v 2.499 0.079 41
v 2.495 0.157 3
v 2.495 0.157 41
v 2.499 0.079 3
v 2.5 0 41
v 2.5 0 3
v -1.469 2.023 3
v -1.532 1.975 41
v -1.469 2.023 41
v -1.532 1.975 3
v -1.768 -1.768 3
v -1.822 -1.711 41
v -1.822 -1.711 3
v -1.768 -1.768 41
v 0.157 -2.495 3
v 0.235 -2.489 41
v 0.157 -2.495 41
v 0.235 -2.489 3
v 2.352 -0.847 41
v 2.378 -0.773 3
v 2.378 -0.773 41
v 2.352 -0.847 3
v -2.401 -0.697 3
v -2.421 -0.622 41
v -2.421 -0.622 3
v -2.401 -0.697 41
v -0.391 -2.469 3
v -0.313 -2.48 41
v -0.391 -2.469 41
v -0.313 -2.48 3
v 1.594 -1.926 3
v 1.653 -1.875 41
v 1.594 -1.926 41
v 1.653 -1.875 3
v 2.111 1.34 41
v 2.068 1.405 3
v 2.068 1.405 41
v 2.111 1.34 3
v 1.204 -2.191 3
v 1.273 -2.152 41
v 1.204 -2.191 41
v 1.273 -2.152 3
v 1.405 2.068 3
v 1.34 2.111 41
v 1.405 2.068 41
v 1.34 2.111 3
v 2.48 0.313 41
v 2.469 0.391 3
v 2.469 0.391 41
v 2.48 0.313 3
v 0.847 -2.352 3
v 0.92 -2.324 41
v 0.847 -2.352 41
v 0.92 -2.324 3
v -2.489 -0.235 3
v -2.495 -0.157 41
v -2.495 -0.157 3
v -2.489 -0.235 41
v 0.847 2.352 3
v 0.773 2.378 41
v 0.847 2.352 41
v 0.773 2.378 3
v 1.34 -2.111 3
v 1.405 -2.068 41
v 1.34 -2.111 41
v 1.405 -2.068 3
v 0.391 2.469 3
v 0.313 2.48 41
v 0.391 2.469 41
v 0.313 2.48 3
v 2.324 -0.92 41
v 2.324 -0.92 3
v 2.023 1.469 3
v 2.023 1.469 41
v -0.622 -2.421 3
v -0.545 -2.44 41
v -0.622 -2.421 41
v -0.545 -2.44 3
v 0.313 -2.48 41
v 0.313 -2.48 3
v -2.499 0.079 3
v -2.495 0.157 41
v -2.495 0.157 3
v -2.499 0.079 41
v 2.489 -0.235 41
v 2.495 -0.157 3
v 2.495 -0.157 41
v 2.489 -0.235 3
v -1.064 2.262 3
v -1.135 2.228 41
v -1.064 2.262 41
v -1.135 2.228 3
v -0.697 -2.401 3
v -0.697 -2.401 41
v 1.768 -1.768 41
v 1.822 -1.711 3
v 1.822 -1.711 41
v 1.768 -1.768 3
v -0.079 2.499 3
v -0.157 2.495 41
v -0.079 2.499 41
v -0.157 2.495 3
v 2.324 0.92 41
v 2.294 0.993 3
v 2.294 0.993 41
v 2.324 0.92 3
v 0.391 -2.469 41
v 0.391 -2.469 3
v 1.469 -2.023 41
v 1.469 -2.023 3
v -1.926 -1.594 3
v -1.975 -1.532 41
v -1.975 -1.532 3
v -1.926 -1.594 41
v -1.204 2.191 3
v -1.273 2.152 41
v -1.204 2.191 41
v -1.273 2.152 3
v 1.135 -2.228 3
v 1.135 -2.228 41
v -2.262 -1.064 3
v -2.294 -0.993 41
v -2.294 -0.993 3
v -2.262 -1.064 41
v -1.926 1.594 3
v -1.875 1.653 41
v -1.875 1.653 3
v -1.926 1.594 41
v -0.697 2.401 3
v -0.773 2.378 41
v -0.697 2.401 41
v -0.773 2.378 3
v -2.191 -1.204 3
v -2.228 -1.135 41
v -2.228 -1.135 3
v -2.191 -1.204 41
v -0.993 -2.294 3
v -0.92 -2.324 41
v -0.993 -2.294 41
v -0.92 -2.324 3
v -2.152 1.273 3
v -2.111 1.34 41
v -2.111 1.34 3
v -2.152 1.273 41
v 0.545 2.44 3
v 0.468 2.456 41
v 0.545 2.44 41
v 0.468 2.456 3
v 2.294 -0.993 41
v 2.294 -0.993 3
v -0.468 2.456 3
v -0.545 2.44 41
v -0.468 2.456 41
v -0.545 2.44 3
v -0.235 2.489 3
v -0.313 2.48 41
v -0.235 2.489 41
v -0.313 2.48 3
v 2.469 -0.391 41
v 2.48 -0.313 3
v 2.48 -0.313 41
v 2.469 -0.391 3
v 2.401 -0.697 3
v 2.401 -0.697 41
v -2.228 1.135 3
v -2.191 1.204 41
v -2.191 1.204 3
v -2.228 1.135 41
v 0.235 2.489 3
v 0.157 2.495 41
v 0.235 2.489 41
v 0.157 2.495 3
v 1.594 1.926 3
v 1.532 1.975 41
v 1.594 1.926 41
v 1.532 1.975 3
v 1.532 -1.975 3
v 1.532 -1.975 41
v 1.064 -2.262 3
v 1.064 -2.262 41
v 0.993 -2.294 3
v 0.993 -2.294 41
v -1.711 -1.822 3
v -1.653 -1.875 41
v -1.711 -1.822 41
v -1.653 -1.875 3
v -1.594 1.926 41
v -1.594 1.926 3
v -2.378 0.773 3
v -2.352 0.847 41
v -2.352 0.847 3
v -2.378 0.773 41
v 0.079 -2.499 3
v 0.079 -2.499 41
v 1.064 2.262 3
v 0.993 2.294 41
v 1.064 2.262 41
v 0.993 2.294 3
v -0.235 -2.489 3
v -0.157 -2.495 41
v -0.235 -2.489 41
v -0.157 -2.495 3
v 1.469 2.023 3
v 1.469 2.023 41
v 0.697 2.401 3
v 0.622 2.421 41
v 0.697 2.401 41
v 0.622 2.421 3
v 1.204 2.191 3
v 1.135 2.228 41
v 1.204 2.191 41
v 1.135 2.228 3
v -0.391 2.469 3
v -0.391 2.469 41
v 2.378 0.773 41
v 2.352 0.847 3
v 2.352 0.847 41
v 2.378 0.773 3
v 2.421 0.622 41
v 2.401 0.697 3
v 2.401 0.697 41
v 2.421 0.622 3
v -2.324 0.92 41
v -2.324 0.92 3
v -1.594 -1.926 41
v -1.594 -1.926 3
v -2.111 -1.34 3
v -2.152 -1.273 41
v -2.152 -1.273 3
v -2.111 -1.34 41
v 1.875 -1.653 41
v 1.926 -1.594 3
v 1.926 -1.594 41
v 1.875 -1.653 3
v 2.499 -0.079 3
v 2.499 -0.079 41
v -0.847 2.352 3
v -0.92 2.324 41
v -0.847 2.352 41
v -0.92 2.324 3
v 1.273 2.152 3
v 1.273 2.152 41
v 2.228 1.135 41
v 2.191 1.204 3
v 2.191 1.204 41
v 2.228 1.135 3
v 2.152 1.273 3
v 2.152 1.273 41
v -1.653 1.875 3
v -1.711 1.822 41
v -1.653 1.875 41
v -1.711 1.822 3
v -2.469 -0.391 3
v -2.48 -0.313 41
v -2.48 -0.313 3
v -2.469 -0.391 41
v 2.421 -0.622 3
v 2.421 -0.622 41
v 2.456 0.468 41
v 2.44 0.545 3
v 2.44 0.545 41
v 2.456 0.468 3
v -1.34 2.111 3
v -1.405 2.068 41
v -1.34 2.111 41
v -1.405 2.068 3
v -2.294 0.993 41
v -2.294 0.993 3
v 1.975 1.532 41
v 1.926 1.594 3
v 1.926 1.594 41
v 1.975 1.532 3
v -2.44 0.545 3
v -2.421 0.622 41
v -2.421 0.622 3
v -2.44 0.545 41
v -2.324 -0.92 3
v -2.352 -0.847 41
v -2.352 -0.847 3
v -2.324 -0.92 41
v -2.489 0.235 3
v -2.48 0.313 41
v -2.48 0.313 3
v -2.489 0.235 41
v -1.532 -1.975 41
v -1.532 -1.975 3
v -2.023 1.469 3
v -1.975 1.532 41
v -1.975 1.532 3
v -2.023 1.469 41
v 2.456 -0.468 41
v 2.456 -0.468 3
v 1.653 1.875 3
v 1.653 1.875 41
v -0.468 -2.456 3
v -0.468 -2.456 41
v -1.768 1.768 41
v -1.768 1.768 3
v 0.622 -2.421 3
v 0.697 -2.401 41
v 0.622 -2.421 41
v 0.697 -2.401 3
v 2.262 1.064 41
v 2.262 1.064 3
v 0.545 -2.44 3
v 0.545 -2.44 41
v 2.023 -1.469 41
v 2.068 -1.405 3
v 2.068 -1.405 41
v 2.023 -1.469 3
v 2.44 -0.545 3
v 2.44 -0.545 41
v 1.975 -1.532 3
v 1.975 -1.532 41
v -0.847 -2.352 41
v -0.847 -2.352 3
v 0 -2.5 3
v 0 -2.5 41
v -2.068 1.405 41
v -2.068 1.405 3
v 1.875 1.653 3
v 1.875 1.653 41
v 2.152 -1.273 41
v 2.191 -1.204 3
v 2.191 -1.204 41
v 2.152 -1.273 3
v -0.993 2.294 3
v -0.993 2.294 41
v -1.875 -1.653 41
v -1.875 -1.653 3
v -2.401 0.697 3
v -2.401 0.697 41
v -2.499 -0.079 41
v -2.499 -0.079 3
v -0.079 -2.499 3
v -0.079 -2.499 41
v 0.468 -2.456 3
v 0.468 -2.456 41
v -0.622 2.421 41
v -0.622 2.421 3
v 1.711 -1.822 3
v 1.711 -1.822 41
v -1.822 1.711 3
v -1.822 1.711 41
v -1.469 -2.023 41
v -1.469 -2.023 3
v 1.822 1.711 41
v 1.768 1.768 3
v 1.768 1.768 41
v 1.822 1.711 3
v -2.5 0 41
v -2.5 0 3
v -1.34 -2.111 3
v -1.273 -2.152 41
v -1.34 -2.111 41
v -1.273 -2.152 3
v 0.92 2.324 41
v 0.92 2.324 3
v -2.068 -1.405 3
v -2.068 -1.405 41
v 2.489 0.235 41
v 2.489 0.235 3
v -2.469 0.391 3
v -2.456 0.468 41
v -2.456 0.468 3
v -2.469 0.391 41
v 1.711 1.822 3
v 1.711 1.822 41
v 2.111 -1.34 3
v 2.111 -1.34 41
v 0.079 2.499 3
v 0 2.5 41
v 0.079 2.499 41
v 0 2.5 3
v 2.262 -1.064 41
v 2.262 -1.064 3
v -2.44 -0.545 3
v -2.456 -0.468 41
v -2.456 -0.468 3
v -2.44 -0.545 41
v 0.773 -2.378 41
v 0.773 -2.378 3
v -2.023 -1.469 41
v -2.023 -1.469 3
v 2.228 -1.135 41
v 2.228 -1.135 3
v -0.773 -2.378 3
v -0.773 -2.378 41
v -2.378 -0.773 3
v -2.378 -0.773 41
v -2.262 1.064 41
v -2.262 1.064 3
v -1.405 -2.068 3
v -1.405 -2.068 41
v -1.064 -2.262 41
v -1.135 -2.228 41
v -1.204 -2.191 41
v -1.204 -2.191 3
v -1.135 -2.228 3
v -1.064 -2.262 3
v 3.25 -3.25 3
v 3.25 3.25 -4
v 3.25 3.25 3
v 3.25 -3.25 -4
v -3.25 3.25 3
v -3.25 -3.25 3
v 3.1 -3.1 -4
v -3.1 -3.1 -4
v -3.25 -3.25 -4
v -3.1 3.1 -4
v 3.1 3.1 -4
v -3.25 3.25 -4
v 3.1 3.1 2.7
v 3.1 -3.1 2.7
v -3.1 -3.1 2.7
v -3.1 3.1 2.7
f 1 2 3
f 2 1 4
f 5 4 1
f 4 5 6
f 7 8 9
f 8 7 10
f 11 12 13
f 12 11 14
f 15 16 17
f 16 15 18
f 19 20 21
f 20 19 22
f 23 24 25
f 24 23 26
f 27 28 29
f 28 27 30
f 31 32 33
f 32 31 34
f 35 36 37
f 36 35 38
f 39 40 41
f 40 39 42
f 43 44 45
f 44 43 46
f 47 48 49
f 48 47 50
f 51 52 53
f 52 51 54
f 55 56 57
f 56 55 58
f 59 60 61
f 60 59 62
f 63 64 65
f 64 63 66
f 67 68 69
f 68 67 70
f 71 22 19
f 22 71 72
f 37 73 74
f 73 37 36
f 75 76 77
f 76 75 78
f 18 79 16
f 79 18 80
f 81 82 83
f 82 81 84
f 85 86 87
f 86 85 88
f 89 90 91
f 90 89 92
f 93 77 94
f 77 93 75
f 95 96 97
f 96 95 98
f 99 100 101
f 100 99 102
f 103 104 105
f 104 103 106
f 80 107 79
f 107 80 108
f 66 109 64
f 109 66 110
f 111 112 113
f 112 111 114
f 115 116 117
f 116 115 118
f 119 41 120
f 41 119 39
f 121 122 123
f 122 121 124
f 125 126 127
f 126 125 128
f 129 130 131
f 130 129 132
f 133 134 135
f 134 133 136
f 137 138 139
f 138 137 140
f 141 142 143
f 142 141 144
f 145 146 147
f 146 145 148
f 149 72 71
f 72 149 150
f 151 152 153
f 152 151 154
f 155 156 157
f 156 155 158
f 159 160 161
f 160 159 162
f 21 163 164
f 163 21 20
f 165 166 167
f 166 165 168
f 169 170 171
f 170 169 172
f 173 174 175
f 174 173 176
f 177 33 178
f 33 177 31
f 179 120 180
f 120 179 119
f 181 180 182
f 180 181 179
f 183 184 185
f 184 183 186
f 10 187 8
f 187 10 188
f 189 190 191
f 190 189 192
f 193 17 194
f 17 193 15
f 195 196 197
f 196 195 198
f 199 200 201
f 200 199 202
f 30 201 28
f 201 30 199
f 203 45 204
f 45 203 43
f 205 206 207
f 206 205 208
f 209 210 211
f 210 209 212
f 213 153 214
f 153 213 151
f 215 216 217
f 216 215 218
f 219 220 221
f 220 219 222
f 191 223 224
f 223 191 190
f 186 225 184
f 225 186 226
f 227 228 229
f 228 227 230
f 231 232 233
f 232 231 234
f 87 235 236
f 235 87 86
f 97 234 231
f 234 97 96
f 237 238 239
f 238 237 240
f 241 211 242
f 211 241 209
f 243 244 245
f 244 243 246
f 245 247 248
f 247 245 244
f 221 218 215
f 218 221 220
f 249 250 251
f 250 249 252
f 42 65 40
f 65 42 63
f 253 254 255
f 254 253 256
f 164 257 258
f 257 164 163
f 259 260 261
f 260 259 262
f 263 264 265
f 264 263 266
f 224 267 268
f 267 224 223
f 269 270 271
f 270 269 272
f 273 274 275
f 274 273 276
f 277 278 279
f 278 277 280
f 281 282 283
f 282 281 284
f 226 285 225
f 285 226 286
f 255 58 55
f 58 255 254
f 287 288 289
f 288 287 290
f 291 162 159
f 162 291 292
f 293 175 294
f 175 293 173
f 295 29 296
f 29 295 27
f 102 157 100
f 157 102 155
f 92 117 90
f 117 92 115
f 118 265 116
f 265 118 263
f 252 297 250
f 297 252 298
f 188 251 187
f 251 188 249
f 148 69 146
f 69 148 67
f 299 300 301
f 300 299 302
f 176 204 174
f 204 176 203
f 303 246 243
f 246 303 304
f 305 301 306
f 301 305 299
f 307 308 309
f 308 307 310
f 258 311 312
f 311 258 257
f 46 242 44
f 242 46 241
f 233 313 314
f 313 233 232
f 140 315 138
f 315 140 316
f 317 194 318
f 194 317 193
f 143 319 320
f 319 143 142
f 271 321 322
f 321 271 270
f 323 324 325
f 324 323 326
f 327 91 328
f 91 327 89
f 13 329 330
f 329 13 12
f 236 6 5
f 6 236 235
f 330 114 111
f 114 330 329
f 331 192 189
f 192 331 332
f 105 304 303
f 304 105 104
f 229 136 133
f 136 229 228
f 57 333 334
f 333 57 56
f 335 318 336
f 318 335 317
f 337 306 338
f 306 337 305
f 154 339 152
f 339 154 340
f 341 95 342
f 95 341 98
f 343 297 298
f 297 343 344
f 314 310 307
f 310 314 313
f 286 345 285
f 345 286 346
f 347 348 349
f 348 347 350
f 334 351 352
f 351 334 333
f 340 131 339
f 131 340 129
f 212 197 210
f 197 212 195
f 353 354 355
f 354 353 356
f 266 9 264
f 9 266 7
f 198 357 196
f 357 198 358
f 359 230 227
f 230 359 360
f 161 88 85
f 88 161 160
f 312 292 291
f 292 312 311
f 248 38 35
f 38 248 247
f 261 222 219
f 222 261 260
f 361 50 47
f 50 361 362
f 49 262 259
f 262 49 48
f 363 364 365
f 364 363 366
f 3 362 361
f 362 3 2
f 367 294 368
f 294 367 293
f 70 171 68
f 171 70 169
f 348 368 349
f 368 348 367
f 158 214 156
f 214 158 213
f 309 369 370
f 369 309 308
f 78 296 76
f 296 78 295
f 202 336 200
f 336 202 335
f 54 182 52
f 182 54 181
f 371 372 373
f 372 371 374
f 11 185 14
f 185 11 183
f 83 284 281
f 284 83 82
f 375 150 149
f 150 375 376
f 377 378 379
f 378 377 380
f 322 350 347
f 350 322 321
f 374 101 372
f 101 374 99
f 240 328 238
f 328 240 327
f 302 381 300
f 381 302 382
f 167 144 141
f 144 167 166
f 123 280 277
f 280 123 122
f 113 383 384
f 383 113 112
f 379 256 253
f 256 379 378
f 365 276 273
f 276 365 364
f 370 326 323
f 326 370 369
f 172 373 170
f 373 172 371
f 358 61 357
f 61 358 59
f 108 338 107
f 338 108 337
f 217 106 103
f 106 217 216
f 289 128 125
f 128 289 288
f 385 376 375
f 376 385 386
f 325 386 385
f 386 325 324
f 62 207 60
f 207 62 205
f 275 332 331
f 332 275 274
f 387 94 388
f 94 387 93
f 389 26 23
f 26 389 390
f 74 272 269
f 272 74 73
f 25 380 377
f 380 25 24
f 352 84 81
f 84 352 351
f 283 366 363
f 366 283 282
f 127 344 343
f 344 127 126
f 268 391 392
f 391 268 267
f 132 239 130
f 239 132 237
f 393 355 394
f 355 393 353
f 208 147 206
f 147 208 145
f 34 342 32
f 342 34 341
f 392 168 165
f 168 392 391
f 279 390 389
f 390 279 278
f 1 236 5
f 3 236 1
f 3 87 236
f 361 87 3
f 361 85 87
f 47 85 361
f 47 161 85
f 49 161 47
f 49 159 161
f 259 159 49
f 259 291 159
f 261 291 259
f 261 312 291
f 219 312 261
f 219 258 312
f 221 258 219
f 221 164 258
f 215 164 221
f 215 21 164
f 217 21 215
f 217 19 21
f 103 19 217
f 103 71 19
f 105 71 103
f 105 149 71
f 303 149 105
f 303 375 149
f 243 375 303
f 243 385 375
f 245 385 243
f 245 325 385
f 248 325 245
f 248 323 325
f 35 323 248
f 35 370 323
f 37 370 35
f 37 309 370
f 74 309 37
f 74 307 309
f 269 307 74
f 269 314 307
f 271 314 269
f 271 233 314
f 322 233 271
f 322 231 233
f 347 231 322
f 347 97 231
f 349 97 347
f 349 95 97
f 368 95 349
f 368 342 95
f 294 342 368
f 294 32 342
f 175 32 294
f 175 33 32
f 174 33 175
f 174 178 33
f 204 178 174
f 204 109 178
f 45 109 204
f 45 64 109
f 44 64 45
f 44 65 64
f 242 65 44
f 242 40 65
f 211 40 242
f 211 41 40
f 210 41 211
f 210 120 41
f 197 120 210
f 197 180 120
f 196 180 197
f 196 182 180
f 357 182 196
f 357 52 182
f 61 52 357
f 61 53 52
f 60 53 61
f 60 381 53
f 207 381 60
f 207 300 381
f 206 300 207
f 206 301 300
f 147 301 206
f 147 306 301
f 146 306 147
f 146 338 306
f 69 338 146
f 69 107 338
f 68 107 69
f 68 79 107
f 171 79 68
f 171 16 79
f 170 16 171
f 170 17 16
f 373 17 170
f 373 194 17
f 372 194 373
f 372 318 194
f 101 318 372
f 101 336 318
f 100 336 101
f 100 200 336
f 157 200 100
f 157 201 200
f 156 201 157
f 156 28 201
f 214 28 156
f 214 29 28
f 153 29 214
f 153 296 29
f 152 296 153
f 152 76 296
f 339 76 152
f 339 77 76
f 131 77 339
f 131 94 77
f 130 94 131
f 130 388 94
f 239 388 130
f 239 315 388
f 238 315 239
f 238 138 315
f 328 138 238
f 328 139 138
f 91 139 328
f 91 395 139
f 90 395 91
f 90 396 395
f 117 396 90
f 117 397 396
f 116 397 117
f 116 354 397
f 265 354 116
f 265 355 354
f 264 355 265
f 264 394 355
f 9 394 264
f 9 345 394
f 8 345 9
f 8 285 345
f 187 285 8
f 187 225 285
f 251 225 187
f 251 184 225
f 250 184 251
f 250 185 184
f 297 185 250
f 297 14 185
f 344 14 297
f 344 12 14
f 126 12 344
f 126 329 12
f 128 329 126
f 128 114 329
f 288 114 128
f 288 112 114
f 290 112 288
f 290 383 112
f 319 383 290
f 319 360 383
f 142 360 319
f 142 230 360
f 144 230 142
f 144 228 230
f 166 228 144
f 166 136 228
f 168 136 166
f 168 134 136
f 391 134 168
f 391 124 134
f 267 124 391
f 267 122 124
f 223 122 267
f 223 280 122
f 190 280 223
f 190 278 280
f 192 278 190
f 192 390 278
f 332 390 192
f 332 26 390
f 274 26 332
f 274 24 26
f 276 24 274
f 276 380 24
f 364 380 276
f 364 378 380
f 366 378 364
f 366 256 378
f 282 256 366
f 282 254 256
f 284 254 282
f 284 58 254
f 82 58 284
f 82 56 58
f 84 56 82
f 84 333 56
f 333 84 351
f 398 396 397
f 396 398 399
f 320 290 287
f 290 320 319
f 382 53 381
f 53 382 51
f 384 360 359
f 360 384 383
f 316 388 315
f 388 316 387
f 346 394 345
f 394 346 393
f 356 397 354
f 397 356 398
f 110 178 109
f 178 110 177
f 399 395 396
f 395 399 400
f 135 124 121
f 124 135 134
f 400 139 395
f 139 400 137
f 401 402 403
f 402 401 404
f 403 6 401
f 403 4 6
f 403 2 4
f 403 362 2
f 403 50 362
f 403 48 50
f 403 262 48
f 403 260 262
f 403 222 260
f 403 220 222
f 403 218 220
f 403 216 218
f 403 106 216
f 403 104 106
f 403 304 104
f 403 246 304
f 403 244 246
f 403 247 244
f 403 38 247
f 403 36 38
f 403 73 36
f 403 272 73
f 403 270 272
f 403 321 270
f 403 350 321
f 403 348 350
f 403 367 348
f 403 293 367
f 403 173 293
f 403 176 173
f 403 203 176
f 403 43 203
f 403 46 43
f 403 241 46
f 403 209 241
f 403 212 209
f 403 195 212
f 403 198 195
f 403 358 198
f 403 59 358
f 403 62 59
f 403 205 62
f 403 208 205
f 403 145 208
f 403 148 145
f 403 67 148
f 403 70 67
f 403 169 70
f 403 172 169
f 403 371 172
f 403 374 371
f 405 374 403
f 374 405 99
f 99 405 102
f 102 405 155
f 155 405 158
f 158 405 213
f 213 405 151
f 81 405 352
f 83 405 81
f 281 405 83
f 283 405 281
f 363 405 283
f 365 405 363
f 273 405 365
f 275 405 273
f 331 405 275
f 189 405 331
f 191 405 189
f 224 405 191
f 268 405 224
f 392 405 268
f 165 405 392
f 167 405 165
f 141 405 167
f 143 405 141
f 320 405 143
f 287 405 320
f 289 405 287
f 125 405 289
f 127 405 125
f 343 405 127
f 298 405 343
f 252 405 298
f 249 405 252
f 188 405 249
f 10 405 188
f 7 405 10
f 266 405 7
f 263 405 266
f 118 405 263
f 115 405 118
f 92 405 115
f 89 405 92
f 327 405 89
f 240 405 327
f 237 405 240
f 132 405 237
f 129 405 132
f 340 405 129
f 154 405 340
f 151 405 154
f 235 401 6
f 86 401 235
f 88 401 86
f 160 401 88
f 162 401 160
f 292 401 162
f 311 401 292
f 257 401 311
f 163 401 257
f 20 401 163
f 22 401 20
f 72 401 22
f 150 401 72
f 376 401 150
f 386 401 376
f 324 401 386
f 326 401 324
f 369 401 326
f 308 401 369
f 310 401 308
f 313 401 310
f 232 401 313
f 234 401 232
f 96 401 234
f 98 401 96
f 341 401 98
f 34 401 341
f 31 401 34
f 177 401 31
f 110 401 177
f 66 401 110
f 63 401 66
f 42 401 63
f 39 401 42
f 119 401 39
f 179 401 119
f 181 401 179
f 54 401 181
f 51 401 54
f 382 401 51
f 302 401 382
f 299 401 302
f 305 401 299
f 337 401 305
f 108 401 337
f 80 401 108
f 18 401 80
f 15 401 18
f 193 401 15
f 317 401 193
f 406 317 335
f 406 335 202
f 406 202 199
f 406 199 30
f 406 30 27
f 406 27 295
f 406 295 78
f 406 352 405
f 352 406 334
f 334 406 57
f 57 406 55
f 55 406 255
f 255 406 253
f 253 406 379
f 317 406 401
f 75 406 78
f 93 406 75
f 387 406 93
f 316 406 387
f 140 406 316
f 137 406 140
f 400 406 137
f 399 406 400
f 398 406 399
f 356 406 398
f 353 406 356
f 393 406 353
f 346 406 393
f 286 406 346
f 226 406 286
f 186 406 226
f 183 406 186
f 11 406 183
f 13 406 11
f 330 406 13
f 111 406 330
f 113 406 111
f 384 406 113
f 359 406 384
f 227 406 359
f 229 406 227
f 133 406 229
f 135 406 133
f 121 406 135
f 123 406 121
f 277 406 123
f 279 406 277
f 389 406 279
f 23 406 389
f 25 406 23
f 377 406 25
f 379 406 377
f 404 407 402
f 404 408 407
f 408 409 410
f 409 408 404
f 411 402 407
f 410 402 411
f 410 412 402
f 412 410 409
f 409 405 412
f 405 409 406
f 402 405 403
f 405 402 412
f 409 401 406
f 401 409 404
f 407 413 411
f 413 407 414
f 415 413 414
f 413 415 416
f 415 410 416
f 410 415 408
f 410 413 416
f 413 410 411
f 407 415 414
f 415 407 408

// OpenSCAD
rotate([00,0,0])
translate([0,0,1])
    difference()
    {
    union()
    {
    scale([0.25,0.25,4])
    cylinder(10,10,10,$fn=200);
    
    
    translate([0,0,-1.5]) 
    cube([6.5,6.5,7],true);
    }
    translate([0,0,-1.8]) 
    cube([6.2,6.2,7],true);
    
}
